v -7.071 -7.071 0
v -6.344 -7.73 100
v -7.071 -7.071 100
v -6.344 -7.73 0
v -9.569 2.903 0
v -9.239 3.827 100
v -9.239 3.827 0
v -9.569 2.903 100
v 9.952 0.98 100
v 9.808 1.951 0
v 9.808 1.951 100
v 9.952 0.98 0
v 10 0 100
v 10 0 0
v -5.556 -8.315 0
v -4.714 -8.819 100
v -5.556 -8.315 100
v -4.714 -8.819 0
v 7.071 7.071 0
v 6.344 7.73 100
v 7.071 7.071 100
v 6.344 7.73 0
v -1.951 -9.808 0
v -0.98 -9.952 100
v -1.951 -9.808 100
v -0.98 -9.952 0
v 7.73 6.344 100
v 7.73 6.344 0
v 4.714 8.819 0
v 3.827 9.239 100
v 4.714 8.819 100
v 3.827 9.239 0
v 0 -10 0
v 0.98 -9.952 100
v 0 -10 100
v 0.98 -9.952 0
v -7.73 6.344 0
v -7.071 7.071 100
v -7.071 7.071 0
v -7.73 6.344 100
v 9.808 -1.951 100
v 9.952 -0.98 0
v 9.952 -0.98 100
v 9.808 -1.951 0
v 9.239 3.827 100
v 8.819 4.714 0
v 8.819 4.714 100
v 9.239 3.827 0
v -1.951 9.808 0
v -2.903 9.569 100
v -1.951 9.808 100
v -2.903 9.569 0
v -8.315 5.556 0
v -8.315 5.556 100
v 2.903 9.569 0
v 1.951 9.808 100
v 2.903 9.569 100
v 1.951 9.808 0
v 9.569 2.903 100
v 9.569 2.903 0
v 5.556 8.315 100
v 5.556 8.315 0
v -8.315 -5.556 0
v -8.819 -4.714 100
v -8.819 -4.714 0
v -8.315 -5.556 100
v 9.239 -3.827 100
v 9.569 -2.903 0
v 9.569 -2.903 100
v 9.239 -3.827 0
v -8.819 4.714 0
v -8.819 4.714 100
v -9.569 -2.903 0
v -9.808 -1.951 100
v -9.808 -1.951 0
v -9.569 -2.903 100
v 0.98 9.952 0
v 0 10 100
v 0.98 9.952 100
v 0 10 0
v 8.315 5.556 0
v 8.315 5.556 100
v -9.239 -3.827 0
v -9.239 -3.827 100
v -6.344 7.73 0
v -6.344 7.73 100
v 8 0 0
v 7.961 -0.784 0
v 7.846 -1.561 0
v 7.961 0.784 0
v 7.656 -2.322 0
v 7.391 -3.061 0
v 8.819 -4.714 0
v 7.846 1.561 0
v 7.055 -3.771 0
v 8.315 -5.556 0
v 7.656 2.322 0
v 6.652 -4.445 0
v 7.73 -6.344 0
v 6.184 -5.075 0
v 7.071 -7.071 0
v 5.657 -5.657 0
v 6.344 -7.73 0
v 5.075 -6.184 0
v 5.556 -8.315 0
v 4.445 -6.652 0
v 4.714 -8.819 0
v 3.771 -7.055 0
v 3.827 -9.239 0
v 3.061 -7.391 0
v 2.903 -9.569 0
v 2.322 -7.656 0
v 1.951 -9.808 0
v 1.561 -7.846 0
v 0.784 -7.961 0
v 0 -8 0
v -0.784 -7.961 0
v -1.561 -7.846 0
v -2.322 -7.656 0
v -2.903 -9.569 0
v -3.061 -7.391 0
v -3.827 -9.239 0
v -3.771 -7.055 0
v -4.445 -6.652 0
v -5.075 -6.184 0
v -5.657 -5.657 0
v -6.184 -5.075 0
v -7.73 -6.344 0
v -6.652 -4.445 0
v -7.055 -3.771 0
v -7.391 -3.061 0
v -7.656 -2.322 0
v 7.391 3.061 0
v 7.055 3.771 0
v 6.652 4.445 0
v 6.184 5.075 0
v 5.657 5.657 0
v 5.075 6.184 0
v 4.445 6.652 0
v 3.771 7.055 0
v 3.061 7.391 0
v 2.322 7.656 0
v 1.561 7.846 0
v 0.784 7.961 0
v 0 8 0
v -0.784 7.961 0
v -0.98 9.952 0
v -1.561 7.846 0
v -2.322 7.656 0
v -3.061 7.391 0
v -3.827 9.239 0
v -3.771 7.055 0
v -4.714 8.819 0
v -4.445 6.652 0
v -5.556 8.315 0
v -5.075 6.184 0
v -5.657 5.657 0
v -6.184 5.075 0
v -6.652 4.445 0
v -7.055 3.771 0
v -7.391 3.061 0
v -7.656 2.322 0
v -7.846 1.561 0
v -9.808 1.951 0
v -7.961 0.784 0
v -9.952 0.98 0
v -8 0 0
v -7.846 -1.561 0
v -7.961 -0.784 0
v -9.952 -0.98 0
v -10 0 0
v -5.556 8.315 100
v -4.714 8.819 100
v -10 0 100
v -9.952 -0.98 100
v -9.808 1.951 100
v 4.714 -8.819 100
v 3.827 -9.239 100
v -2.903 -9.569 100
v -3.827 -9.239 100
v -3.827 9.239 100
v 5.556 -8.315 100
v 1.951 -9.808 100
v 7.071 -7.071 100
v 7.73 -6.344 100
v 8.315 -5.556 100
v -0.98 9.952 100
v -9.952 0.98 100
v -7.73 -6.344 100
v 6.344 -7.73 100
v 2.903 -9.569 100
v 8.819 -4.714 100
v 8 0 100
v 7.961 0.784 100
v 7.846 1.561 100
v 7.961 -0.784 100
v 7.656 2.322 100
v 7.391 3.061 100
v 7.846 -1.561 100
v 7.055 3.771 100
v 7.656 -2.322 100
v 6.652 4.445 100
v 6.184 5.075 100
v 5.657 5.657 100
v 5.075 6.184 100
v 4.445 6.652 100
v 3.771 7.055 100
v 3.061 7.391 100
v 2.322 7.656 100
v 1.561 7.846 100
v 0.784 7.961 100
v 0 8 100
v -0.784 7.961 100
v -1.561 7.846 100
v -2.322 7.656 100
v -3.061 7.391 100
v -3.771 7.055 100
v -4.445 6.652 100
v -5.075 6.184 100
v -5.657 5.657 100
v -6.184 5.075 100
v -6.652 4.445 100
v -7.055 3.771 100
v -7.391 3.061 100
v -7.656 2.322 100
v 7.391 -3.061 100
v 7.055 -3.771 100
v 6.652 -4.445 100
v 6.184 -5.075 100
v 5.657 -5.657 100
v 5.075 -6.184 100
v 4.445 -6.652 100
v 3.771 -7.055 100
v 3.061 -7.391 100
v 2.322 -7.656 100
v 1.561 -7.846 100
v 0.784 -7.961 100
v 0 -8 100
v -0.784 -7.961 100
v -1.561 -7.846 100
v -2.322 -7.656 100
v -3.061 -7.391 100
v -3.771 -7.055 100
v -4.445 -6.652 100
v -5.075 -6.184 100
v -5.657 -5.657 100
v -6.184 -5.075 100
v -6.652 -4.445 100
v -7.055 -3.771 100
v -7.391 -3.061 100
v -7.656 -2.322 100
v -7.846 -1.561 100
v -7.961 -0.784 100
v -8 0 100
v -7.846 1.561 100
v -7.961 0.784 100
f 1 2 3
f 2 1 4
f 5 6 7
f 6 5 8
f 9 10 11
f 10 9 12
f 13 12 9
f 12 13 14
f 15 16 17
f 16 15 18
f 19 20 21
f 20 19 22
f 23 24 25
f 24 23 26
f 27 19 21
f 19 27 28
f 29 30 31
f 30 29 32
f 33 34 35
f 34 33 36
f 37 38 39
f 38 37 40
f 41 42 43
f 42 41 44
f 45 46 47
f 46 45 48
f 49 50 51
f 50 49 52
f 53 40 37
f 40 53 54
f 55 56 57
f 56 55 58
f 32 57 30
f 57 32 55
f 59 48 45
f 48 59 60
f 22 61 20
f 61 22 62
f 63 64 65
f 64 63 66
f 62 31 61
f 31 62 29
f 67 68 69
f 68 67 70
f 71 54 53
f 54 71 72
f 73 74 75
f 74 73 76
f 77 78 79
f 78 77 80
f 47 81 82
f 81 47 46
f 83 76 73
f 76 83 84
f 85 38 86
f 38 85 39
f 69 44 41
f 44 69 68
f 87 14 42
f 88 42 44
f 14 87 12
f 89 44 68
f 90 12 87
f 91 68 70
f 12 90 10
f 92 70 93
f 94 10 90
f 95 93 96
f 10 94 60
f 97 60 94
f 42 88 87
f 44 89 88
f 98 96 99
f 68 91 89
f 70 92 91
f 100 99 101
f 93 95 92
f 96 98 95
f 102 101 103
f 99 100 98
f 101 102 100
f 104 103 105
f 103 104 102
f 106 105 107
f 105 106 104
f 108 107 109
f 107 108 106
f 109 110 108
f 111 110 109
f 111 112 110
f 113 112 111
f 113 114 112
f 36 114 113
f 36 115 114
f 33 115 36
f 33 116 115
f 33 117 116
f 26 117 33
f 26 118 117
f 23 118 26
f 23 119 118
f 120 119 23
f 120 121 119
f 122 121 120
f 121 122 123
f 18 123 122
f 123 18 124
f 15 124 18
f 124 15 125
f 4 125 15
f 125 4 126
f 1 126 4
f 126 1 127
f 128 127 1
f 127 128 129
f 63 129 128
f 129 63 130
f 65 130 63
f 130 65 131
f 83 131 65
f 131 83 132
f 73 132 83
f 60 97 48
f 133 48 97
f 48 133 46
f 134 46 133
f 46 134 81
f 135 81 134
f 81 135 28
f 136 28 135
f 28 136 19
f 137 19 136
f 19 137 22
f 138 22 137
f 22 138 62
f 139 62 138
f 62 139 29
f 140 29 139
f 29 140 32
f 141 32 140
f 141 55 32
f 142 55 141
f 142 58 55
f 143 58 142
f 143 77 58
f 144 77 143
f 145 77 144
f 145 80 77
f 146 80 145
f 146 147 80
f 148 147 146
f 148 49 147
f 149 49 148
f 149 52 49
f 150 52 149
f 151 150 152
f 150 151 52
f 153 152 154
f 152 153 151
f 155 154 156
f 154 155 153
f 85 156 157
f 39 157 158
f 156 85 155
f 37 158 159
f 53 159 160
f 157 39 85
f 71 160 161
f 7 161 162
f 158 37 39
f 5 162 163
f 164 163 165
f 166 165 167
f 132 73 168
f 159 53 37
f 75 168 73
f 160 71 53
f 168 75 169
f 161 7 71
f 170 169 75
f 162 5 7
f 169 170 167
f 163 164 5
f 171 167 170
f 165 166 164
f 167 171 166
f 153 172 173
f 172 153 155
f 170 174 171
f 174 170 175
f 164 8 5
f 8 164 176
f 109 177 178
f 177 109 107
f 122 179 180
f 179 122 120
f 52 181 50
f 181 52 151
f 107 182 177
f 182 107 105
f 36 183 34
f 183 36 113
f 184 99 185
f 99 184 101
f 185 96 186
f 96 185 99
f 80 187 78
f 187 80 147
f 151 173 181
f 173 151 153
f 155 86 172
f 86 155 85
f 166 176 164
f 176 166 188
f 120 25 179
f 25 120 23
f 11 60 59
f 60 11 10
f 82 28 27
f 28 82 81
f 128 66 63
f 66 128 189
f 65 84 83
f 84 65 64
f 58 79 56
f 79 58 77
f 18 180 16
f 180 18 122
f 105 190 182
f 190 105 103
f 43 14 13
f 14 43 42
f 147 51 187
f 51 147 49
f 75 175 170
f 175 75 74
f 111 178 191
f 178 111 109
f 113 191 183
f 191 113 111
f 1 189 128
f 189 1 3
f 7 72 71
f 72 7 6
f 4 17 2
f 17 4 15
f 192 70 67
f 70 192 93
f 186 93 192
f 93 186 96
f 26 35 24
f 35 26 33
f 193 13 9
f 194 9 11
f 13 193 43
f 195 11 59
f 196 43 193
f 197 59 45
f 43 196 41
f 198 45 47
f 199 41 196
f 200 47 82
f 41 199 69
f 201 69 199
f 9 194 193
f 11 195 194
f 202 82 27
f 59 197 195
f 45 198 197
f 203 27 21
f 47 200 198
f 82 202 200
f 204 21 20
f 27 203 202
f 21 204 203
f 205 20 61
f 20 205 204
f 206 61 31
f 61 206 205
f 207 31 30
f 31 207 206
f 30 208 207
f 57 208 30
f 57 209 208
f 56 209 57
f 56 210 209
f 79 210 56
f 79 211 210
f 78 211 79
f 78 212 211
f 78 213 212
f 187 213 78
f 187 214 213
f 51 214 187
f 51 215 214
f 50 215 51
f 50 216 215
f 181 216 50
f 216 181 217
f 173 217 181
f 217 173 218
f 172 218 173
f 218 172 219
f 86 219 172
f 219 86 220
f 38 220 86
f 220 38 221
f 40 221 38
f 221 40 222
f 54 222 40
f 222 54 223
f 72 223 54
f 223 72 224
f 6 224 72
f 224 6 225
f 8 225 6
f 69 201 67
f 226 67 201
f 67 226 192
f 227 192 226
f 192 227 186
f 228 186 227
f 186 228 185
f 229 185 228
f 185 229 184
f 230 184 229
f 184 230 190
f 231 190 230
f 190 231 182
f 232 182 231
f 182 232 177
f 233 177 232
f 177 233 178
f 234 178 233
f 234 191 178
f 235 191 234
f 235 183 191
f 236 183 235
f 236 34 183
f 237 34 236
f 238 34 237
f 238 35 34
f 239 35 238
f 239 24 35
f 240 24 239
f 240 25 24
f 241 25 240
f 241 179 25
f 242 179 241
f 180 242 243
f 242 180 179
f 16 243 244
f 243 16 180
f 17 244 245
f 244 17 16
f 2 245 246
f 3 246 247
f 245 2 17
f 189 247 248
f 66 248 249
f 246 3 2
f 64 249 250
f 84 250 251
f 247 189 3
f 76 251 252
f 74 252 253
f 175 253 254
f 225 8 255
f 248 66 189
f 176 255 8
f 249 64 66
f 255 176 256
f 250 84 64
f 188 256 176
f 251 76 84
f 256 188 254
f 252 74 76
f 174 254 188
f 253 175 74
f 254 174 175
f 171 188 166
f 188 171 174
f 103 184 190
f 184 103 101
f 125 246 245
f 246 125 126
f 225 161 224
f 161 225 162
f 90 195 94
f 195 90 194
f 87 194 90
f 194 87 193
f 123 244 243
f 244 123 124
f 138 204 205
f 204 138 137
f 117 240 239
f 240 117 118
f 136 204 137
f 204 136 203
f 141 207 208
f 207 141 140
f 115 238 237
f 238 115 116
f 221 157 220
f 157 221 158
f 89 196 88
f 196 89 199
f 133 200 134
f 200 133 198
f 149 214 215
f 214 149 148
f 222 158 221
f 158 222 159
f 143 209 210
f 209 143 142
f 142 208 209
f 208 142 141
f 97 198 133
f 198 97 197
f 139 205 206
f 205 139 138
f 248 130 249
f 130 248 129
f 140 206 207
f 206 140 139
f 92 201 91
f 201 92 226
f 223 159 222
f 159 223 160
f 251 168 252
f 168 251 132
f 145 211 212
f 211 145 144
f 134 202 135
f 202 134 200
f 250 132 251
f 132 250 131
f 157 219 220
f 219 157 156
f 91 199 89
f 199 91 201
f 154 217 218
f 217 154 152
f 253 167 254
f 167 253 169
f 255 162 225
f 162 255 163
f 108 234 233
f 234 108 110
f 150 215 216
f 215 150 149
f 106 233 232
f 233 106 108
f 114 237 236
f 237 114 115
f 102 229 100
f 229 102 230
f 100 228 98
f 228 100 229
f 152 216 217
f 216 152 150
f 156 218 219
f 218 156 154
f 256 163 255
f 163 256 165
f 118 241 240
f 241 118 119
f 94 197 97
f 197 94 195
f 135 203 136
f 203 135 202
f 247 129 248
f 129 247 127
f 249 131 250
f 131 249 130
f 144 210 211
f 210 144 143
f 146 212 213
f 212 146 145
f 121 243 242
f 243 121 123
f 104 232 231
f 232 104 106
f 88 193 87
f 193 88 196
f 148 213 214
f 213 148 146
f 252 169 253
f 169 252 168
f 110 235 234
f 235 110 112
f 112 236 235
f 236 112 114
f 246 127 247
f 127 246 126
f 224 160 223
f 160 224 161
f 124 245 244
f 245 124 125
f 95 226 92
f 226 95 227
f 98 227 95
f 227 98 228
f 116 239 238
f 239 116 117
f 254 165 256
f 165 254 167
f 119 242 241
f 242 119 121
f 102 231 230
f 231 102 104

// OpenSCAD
module pvc_aquarium_tubing() {
    difference() {
        cylinder(h=100, r=10, $fn=64);
        translate([0, 0, -1])
            cylinder(h=102, r=8, $fn=64);
    }
}

pvc_aquarium_tubing();
